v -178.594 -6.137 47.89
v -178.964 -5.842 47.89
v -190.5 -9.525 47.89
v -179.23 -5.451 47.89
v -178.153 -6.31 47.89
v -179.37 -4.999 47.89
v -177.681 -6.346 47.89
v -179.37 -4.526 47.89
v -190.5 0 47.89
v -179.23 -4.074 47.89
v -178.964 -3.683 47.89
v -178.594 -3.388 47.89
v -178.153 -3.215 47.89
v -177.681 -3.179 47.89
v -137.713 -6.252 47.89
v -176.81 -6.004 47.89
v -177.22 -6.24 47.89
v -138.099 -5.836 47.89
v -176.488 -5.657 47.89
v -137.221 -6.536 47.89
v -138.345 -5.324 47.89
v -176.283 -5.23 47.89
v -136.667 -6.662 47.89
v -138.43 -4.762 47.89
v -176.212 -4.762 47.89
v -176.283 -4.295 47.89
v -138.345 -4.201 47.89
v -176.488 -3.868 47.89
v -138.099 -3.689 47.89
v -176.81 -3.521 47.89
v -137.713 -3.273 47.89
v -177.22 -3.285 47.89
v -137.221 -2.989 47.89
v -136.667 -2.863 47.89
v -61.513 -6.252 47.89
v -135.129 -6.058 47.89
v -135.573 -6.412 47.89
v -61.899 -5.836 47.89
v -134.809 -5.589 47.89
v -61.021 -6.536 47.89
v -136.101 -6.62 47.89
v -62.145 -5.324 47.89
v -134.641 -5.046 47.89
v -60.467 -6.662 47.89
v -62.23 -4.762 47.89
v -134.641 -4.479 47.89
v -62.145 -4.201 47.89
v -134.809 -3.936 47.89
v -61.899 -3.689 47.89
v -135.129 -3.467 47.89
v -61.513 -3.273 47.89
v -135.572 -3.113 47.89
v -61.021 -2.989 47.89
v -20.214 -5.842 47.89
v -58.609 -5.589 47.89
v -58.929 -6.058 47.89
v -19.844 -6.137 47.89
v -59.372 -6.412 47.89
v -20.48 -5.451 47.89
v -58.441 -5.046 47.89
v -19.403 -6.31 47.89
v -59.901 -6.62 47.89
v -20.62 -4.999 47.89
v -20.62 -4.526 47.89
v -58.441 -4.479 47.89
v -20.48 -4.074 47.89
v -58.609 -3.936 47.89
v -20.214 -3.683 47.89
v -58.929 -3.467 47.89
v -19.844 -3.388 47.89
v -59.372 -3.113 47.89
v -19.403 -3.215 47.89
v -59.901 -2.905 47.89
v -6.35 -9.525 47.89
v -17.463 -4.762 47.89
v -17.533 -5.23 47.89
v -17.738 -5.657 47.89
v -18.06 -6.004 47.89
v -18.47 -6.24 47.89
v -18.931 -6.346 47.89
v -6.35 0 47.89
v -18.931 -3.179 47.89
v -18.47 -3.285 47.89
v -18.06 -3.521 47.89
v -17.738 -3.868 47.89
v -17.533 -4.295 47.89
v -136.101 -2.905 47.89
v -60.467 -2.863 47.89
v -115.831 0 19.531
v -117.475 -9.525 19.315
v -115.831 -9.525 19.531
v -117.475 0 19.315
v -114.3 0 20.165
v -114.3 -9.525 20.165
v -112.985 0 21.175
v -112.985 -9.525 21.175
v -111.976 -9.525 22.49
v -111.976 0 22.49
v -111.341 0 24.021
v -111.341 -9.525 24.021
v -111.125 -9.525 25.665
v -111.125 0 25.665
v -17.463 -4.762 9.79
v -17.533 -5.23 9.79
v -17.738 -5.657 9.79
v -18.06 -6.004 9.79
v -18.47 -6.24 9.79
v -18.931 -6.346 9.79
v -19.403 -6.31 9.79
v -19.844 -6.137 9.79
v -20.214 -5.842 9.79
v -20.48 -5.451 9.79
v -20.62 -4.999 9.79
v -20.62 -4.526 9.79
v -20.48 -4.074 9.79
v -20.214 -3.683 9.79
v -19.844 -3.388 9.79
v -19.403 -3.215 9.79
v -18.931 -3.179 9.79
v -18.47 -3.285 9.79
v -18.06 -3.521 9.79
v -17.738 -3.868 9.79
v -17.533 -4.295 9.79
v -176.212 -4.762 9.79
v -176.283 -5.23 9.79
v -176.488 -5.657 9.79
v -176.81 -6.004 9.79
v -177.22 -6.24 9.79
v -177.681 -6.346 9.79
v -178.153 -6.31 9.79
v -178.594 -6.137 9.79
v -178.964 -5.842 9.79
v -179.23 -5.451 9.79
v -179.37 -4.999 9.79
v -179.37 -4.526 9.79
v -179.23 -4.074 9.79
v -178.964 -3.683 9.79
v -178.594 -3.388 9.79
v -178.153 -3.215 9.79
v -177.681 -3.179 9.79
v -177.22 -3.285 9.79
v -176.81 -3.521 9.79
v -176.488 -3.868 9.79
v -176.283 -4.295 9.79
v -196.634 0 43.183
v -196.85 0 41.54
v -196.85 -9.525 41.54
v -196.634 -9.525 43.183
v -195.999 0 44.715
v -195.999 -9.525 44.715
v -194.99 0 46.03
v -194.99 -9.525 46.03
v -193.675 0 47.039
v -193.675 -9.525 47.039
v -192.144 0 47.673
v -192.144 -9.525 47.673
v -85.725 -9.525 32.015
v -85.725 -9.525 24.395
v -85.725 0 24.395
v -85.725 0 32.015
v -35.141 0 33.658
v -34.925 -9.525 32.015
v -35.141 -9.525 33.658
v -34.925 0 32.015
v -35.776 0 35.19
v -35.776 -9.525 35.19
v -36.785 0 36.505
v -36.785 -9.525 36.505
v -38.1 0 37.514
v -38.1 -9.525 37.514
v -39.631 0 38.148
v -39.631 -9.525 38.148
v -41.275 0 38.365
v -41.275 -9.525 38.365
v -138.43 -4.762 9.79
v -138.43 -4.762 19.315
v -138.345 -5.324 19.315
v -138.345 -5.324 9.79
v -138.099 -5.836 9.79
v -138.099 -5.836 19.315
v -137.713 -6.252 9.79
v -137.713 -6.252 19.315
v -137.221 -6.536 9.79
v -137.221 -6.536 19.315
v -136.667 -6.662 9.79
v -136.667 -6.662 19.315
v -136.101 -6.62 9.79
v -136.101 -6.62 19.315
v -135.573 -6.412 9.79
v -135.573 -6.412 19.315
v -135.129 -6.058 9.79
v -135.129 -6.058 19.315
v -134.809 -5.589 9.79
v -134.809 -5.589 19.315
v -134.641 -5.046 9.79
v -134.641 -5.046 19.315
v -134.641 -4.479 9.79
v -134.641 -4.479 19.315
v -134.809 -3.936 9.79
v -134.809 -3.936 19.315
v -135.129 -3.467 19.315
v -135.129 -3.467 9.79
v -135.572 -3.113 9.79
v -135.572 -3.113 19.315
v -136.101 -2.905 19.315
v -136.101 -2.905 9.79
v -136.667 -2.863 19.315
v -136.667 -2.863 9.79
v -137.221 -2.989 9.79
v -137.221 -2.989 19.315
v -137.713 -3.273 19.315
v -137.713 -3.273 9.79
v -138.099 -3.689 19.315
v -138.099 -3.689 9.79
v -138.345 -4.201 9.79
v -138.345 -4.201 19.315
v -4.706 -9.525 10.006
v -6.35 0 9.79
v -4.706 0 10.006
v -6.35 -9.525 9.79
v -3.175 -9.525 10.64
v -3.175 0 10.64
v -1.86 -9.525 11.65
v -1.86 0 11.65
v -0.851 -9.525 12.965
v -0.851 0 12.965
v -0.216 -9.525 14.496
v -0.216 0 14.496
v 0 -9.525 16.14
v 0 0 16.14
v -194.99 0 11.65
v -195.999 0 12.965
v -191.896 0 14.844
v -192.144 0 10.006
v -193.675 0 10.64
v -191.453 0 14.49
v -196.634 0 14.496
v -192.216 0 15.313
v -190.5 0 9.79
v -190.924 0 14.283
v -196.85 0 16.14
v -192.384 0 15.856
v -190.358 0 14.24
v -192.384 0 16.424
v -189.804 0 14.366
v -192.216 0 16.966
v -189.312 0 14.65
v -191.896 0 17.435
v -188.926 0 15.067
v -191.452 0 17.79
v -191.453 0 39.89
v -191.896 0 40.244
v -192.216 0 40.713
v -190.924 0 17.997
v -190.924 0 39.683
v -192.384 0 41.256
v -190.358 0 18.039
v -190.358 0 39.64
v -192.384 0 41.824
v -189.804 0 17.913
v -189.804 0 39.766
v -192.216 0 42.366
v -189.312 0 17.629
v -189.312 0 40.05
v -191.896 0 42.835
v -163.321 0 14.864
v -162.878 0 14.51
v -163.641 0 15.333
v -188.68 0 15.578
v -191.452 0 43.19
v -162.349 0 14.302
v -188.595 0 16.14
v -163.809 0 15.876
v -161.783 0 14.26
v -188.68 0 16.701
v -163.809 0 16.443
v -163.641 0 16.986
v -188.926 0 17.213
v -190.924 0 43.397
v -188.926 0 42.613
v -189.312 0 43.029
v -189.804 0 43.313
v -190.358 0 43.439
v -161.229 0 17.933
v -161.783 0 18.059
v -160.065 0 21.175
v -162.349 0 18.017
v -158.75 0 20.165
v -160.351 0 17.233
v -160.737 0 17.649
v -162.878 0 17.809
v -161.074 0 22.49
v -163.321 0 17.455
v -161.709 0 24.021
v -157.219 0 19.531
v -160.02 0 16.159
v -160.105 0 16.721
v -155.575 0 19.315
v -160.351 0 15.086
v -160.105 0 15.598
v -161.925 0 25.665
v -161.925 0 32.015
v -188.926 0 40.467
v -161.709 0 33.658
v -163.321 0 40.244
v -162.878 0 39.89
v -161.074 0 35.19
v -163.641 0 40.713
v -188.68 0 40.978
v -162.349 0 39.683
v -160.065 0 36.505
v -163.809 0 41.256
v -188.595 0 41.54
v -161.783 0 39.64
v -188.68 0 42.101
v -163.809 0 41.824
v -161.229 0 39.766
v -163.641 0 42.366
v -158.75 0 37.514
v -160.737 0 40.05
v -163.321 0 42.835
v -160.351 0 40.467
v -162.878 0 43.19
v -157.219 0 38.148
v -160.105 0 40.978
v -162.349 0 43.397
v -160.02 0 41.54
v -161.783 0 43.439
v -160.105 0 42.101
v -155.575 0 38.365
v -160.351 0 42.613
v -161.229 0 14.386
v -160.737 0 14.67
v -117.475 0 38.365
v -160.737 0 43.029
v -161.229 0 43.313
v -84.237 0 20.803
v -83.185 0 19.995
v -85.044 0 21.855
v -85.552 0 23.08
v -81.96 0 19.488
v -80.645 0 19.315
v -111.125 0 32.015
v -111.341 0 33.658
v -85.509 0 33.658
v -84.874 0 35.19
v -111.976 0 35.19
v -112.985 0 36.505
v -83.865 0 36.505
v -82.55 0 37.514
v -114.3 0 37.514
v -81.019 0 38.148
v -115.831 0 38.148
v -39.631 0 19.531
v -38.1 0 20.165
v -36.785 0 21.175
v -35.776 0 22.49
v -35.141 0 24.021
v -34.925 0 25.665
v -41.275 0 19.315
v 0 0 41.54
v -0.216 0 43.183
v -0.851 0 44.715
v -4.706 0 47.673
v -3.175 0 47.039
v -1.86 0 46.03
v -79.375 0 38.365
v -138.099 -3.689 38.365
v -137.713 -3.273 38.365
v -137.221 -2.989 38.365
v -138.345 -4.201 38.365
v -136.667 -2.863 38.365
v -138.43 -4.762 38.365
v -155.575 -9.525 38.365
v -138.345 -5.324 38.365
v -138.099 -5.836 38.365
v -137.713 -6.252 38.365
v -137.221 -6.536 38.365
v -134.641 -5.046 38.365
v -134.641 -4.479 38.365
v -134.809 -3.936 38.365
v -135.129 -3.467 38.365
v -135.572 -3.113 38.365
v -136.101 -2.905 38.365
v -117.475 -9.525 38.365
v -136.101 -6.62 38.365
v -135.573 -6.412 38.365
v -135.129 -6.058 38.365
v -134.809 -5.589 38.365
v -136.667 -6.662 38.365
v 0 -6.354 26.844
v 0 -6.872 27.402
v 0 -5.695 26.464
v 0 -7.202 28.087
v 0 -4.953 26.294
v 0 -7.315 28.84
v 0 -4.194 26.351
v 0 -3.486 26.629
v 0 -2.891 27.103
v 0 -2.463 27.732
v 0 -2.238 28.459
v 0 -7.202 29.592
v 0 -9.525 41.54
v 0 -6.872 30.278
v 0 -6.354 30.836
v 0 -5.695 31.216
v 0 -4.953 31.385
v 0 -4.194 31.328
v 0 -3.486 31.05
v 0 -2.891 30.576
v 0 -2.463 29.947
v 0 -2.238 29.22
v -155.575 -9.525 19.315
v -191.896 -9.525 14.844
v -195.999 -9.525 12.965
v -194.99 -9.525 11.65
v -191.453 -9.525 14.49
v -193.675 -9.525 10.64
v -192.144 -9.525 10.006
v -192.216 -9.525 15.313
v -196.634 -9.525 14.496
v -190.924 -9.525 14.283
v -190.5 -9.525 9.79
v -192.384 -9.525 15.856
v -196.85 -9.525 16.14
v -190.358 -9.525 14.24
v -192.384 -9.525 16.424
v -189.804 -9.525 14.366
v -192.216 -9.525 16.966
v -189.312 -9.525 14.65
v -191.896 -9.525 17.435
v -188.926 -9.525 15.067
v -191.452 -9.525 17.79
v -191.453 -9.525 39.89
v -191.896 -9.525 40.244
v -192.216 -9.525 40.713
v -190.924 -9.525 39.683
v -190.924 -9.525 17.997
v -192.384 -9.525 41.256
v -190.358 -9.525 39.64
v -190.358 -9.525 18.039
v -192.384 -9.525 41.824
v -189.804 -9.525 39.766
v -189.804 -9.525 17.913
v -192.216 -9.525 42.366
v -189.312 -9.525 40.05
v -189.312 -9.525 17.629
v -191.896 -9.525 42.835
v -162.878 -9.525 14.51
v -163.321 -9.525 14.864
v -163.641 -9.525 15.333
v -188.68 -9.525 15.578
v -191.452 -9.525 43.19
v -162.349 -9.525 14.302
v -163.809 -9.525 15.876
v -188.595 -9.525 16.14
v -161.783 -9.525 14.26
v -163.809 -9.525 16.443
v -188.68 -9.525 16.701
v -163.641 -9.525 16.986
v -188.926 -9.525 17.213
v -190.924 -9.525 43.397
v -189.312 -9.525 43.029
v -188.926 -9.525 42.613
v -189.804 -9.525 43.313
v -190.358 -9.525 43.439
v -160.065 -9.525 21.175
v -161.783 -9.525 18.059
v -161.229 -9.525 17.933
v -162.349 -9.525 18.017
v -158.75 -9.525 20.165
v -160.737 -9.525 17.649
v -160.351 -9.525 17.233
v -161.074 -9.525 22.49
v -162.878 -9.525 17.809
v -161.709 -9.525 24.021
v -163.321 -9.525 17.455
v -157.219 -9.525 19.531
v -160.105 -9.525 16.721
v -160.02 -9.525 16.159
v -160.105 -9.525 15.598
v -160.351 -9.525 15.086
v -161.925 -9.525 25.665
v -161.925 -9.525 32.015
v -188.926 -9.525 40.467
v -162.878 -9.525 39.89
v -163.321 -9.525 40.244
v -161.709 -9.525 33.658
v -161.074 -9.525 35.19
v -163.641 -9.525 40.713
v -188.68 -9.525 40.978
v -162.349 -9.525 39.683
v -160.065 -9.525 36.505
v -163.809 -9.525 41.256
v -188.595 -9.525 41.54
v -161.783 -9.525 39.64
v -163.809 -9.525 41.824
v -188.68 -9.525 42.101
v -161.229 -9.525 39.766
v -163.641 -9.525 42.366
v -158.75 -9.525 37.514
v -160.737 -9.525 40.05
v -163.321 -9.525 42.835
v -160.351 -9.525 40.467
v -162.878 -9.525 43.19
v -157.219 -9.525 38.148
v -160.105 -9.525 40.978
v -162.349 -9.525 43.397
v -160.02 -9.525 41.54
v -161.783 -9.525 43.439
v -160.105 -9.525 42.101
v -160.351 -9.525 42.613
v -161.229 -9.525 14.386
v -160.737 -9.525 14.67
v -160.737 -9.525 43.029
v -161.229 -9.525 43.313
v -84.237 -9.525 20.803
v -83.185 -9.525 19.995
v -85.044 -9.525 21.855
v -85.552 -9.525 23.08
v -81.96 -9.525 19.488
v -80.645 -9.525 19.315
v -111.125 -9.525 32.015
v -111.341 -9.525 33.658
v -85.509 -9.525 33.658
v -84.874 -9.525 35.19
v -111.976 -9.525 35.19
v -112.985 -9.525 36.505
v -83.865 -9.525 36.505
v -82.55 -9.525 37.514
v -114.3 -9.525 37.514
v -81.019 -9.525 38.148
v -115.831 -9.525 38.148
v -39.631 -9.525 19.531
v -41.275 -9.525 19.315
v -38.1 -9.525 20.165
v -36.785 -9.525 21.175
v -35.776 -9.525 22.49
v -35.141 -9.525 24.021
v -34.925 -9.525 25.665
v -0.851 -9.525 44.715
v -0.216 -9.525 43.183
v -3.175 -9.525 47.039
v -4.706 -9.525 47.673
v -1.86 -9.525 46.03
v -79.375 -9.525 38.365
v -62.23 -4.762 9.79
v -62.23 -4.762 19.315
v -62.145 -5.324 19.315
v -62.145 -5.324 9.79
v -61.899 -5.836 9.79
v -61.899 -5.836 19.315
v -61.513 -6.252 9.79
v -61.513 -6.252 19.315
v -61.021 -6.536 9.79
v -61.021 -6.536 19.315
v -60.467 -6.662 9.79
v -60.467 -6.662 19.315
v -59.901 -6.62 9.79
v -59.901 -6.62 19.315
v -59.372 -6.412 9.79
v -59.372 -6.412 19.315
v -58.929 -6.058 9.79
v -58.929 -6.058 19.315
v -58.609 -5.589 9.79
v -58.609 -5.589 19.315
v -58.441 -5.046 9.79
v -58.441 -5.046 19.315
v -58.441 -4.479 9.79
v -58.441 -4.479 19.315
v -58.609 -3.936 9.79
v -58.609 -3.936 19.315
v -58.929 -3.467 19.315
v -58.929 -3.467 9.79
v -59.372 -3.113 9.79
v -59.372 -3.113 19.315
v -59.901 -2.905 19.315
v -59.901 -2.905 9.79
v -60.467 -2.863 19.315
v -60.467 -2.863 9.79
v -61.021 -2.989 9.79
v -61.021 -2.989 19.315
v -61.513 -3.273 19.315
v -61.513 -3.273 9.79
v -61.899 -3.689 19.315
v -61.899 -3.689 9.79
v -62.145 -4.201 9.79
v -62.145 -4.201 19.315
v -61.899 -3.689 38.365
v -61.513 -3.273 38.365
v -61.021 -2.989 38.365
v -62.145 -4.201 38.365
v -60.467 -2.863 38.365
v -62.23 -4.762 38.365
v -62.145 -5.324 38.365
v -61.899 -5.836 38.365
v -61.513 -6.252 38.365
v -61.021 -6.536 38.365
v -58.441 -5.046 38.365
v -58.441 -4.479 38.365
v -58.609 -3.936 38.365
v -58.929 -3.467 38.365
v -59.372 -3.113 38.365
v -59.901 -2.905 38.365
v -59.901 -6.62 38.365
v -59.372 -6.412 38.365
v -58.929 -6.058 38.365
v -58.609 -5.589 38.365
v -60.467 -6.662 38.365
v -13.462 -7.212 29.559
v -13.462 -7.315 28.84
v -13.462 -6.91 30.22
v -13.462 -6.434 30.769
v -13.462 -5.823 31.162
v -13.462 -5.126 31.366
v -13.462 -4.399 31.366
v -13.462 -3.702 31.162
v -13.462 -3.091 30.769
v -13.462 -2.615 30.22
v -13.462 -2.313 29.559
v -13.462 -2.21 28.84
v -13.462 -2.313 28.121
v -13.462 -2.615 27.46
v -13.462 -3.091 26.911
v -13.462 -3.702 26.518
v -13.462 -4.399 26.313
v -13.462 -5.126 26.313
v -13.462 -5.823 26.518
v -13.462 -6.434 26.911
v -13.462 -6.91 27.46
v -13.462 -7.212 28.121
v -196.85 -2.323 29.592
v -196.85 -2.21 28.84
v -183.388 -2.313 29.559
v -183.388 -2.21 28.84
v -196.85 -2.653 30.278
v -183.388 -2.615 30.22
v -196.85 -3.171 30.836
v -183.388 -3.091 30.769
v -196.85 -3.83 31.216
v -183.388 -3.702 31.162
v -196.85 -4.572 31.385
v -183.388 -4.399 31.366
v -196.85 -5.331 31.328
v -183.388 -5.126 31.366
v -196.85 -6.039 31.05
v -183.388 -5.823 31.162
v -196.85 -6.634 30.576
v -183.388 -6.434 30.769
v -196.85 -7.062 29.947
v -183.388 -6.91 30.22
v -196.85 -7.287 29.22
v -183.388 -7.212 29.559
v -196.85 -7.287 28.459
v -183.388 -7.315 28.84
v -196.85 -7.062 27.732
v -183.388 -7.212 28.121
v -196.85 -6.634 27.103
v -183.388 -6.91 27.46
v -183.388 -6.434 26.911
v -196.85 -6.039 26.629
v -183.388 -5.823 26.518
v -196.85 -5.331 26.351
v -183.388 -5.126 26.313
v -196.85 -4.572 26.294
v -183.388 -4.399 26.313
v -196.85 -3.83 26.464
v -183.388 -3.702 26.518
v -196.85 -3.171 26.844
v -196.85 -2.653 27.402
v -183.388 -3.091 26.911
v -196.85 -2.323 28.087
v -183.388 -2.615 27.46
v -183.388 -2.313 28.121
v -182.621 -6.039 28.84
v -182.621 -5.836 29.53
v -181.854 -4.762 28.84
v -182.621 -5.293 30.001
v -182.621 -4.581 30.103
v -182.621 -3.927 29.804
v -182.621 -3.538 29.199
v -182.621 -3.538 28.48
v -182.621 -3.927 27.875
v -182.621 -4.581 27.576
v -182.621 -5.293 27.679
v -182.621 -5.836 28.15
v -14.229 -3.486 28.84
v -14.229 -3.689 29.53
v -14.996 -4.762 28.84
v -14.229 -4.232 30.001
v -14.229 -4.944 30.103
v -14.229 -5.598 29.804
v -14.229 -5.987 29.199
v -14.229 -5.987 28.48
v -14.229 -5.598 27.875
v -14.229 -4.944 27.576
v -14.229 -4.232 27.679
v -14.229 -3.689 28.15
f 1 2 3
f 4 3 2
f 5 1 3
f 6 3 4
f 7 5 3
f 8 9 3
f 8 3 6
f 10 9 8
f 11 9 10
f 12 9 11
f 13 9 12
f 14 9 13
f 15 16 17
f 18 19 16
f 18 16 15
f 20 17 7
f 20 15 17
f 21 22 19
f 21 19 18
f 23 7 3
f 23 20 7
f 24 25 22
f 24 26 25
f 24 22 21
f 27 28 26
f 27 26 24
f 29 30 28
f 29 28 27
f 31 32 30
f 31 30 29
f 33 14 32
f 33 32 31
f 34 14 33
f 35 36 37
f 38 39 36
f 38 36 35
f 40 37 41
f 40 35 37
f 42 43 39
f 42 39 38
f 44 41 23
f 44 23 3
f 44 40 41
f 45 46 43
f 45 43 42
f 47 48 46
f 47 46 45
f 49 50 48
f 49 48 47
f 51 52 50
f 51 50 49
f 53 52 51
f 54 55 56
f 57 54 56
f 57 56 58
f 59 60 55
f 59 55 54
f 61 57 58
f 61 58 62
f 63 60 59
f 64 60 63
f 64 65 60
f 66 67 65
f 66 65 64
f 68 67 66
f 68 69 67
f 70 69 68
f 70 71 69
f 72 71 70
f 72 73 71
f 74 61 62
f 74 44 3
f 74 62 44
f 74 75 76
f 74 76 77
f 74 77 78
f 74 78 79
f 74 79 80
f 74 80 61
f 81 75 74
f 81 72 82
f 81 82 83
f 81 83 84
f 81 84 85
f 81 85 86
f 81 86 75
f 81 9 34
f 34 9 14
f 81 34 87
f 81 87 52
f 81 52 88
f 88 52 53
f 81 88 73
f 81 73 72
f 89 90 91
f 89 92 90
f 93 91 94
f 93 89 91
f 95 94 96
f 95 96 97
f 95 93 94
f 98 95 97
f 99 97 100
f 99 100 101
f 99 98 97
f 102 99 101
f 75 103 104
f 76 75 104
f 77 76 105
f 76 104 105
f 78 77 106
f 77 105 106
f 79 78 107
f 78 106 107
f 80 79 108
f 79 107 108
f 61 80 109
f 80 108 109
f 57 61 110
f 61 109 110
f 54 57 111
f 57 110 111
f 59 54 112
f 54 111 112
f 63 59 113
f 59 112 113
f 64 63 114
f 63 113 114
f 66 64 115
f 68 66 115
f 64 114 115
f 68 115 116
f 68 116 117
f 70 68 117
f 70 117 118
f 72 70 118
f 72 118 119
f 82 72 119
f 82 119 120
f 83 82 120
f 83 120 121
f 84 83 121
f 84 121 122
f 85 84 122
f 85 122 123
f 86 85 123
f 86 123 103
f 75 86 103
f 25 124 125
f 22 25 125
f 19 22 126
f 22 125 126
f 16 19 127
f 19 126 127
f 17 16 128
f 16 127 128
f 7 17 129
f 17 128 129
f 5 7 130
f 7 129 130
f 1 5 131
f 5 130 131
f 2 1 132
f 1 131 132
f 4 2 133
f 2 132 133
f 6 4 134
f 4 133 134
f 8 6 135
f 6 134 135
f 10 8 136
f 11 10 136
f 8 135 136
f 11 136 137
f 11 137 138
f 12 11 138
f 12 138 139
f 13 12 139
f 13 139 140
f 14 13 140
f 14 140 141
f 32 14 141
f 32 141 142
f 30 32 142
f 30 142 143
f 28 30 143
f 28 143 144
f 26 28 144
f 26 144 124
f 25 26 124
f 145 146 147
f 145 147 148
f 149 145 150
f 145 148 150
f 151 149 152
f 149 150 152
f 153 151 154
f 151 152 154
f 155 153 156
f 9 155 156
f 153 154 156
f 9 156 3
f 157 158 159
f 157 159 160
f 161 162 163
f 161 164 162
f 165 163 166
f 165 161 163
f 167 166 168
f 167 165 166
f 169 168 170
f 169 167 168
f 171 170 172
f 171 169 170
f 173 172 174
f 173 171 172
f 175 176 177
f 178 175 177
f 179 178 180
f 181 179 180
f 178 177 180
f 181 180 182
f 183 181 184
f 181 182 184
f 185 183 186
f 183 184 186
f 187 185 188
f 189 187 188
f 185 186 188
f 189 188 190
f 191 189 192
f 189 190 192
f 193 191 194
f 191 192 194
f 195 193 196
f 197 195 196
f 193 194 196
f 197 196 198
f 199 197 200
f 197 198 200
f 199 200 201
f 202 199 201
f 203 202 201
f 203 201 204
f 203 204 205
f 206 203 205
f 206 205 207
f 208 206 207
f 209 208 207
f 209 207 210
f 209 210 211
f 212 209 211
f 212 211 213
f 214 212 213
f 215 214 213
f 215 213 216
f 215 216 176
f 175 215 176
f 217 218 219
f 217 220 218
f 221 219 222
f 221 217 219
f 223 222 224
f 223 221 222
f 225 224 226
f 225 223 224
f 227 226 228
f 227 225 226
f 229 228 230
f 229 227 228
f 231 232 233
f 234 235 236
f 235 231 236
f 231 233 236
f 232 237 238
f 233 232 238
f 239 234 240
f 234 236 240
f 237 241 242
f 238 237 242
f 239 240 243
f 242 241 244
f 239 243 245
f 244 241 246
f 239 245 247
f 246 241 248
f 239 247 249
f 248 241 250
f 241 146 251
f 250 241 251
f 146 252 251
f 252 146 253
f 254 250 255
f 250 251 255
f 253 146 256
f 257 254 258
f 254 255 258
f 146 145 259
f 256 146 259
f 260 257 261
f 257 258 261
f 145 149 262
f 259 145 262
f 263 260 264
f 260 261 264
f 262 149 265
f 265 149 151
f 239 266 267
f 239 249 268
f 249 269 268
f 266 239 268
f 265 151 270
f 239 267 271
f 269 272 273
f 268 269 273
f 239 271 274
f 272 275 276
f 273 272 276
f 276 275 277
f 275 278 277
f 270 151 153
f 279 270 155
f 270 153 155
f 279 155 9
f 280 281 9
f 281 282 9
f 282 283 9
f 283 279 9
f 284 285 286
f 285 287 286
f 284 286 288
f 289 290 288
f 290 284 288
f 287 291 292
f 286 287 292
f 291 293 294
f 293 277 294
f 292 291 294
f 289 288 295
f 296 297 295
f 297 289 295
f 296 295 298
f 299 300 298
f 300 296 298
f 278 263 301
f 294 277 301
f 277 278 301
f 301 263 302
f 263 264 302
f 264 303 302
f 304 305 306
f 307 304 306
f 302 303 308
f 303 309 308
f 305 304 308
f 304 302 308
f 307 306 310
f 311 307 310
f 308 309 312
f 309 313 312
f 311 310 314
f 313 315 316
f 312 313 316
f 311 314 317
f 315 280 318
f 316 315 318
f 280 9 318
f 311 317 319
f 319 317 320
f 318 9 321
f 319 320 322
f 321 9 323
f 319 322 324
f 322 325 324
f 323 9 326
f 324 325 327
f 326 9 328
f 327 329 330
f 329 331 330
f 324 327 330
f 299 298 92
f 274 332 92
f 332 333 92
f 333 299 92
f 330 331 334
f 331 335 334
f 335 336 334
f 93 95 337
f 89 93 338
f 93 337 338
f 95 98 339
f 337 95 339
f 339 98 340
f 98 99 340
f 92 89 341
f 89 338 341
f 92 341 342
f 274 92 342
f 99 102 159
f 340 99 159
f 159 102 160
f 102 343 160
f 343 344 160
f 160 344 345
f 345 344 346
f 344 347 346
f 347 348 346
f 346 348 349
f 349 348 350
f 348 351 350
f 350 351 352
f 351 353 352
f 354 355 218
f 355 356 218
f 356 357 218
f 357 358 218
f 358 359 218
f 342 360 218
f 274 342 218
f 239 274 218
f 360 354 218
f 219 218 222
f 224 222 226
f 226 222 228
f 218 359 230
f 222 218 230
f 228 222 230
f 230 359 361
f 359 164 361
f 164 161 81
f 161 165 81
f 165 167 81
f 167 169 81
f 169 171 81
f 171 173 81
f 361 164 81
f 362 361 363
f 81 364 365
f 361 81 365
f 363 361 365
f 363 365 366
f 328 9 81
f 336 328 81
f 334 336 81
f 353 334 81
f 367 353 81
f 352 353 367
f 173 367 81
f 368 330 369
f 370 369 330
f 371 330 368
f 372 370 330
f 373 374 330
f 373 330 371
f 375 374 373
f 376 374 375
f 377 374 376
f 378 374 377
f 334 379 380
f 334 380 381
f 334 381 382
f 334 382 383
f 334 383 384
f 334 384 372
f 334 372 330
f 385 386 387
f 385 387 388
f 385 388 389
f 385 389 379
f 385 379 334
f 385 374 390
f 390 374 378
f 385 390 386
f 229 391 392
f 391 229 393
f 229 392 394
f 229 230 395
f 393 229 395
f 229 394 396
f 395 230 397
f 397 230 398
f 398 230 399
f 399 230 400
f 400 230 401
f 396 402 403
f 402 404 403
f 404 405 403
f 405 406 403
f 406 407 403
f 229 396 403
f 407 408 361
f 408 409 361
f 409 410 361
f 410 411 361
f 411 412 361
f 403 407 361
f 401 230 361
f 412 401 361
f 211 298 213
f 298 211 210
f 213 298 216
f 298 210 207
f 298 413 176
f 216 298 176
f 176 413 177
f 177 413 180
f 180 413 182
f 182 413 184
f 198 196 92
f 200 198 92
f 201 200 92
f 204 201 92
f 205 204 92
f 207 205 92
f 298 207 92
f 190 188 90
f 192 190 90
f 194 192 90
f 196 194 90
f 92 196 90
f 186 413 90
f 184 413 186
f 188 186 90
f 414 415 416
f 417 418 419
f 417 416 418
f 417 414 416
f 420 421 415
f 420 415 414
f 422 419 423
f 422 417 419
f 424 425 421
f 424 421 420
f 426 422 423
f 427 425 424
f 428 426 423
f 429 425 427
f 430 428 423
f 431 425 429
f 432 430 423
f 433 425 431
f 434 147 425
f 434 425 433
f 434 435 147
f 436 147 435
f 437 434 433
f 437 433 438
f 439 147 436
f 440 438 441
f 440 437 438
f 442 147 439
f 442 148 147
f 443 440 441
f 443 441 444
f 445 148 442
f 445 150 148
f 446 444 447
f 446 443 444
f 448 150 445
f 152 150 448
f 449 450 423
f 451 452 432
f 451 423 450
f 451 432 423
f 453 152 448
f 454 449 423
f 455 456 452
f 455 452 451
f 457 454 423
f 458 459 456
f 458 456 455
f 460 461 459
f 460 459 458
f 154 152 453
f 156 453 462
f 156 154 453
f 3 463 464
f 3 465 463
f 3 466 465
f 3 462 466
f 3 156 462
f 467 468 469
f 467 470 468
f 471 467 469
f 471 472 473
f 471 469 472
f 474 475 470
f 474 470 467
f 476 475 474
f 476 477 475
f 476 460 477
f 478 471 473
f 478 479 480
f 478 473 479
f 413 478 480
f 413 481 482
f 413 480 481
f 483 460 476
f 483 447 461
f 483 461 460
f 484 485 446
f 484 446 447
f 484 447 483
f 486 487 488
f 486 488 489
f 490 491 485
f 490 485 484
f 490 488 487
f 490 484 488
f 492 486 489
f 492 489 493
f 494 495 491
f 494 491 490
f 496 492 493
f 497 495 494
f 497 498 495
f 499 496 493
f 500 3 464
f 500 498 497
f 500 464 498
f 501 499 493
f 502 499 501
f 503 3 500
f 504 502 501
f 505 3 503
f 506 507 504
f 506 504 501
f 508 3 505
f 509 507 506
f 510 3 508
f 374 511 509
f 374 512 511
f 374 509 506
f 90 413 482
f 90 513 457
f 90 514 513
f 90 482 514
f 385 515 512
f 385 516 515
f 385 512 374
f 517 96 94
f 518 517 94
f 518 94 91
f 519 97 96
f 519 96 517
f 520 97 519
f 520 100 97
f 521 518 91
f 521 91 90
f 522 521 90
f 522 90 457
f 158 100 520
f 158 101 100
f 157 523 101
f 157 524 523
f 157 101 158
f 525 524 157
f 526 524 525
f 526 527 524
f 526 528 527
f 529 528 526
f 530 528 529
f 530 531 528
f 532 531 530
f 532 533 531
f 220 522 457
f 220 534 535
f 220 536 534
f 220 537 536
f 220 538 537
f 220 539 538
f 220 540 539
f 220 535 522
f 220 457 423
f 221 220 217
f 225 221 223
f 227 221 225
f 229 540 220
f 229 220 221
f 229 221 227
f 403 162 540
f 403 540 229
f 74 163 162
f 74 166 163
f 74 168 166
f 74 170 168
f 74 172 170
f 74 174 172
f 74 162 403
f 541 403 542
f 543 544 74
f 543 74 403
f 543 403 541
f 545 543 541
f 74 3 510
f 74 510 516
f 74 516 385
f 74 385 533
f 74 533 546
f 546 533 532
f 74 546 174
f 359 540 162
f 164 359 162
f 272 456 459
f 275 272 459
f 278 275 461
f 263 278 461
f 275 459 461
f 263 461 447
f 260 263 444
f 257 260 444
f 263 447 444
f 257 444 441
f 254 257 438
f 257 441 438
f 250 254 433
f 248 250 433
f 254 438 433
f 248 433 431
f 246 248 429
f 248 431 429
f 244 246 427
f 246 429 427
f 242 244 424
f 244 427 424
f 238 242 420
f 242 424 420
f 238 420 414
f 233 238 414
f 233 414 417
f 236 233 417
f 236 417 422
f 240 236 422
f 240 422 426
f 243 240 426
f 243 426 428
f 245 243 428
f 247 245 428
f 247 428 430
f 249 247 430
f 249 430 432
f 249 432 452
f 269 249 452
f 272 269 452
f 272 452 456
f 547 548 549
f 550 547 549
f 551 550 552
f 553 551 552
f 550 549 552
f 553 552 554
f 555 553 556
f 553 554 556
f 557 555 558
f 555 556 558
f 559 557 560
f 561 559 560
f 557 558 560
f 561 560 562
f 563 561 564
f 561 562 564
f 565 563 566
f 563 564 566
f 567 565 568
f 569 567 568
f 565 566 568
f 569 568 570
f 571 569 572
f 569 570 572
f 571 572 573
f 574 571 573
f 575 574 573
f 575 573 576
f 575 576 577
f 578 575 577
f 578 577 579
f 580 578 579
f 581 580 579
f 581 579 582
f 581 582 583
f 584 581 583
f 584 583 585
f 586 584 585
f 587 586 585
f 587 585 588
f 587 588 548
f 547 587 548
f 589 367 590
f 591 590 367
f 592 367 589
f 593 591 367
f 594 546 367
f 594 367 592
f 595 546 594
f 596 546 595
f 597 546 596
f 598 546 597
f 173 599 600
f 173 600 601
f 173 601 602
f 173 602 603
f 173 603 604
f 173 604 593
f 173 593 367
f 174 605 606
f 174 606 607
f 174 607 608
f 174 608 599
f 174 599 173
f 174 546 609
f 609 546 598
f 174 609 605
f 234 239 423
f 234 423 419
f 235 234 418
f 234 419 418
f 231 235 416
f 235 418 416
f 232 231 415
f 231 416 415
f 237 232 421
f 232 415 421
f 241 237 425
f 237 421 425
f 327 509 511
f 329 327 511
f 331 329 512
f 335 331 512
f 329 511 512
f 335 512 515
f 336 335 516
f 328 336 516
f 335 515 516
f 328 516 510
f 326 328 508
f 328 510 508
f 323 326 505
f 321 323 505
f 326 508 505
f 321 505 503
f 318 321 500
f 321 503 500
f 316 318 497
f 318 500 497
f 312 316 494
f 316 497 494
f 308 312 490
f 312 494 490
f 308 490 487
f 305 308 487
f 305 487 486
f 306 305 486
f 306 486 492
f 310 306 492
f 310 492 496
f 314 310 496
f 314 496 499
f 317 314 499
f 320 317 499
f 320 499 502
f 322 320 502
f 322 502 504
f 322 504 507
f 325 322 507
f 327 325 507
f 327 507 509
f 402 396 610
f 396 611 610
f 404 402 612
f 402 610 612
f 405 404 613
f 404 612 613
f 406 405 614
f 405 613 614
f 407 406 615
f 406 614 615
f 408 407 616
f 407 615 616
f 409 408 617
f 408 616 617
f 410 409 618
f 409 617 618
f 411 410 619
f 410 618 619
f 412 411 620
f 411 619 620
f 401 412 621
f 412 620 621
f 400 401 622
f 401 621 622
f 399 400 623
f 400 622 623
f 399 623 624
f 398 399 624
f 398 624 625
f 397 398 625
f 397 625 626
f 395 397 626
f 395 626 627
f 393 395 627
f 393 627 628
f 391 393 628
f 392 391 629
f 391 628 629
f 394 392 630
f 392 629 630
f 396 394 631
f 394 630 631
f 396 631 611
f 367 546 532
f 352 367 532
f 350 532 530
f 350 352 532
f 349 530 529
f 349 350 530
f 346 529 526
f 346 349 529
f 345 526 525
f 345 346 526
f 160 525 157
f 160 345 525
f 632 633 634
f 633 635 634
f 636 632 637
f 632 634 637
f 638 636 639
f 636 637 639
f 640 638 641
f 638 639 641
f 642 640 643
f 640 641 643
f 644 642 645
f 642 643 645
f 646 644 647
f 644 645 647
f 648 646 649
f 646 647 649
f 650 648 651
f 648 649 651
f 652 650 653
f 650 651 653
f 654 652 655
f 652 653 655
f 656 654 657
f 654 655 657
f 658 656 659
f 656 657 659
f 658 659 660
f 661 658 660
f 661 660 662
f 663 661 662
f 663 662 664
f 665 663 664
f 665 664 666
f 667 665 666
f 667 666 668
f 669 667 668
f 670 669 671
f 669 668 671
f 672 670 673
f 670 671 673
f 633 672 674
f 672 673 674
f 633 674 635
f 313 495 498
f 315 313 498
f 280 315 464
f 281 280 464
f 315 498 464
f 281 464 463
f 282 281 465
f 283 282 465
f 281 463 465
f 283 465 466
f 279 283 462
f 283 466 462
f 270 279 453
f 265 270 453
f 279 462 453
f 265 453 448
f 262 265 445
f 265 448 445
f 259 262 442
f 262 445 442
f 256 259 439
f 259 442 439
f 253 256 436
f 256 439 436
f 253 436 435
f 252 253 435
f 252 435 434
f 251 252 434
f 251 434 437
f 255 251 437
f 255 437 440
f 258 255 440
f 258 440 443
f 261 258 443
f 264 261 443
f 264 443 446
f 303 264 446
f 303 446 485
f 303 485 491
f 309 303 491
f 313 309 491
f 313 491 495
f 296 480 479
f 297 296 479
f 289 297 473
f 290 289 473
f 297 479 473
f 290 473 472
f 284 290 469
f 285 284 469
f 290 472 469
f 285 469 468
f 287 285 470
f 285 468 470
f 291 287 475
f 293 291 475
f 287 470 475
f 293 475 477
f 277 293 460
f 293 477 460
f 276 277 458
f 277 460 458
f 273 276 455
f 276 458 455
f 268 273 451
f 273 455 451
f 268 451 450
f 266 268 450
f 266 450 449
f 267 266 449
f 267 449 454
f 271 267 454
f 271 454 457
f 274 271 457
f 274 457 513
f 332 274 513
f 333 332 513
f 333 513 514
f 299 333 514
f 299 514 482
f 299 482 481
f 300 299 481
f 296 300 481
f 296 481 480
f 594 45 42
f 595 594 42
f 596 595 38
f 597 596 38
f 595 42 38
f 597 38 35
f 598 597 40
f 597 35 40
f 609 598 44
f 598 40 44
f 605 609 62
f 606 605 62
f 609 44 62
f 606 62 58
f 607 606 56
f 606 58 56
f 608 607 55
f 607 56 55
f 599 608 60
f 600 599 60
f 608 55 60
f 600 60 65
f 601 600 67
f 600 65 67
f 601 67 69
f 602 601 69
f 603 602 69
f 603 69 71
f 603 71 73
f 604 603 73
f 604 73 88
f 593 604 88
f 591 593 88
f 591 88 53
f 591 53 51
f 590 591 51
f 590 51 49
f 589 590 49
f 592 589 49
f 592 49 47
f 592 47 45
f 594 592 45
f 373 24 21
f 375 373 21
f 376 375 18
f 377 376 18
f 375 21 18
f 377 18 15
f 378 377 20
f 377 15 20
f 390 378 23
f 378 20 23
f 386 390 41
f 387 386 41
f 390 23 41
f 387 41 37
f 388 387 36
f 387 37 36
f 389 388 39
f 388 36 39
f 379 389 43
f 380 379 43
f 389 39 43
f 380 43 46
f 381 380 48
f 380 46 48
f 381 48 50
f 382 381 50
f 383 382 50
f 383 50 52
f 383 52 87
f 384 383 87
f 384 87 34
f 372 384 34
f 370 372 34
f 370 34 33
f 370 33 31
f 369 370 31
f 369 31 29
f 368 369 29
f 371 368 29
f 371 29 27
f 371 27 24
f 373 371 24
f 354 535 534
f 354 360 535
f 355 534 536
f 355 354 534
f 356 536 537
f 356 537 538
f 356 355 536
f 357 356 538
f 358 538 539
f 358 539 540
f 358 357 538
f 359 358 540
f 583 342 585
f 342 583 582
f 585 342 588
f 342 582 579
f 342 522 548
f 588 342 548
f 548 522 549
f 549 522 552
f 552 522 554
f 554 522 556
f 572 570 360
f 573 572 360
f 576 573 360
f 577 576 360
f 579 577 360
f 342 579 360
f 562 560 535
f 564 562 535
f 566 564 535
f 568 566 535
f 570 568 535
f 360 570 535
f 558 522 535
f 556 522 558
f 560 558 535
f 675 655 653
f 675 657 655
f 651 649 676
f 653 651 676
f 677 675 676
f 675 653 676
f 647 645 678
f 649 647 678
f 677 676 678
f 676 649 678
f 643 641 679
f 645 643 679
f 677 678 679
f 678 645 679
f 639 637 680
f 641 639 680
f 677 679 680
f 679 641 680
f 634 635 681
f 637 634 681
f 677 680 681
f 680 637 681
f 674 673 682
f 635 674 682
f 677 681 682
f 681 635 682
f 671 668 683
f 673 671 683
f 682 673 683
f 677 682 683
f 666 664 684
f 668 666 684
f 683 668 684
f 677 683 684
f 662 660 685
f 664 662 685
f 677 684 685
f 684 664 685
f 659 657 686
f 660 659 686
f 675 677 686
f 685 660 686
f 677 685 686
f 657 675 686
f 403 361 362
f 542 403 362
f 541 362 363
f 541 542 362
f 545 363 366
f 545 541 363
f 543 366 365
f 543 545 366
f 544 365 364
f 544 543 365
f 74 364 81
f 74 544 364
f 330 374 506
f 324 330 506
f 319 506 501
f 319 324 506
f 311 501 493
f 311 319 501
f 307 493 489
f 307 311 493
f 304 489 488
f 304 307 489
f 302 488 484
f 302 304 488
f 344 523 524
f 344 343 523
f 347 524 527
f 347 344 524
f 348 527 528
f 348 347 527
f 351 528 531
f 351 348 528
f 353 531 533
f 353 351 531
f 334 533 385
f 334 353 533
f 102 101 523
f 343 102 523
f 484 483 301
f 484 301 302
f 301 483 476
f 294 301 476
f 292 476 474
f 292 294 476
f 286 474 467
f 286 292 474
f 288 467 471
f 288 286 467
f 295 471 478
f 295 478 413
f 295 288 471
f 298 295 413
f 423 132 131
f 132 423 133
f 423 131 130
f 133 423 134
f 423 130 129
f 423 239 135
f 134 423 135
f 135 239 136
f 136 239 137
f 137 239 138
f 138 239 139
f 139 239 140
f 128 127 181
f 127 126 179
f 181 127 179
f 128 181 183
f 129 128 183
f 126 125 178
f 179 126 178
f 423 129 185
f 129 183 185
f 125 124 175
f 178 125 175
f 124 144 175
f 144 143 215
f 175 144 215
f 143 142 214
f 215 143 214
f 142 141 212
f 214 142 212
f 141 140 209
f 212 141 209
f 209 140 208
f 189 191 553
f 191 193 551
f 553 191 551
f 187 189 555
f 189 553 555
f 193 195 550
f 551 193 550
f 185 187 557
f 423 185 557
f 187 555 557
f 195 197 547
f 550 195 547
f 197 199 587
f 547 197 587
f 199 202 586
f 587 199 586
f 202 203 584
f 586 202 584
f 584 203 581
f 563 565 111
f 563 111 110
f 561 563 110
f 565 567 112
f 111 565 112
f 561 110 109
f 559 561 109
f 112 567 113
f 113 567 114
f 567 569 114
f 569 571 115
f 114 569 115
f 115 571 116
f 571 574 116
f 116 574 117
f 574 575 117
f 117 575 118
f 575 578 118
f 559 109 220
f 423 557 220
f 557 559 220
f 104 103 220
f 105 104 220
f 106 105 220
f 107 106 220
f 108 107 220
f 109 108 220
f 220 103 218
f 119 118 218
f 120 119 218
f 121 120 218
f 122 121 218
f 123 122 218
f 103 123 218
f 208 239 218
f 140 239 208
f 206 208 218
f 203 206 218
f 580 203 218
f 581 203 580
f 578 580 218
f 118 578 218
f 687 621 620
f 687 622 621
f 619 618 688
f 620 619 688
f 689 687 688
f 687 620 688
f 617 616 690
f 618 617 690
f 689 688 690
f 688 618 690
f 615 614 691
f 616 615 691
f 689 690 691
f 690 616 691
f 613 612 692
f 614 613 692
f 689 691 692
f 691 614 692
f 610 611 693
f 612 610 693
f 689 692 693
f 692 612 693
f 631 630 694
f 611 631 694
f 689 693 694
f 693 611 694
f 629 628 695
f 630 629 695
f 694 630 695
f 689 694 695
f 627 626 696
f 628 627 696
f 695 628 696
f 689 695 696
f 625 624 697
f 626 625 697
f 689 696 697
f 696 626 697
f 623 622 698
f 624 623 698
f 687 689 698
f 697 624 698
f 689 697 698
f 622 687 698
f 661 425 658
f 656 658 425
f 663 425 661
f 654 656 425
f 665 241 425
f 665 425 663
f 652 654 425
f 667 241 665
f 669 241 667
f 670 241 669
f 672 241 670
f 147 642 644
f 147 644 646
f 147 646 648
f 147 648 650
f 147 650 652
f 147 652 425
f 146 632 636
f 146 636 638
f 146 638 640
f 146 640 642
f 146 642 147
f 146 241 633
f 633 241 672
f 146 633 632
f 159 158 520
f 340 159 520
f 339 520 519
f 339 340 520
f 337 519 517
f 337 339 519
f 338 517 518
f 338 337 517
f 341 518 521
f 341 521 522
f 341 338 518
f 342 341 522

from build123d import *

# Parameters (mm, degrees)
F0_W      = 196.85
F0_H      = 38.1
F1_DEPTH  = 9.525
F2_R      = 6.35
F3_R      = 6.35
F4_W      = 50.8
F4_H      = 19.05
F5_DEPTH  = 25.4
F6_R      = 6.35
F7_R      = 6.35
F8_R      = 6.35
F9_R      = 6.35
F10_W     = 50.8
F10_H     = 19.05
F11_DEPTH = 25.4
F12_R     = 6.35
F13_R     = 5.08
F14_R     = 6.35
F15_R     = 6.35
F16_R     = 1.905
F18_DEPTH = 25.4
F20_R     = 1.5875
F21_DEPTH = 48.006
F22_R     = 1.5875
F23_DEPTH = 44.3738
F26_D     = 3.81
F27_D     = 5.1054
F27_DEPTH = 13.462
F27_TIP   = 1.5338169022
F28_D     = 5.1054
F28_DEPTH = 13.462
F28_TIP   = 1.5338169022
F29_R     = 6.35


with BuildPart() as f1:
    # F0 (on Front) → F1 (new body)
    with BuildSketch(Plane.XZ):
        with Locations((-98.425, 28.8397434607)):
            Rectangle(F0_W, F0_H)
    extrude(amount=F1_DEPTH)

    # F2
    f2_edges = [f1.edges().sort_by_distance(p)[0] for p in [
        (0, -4.7625, 9.789743),
    ]]
    fillet(f2_edges, radius=F2_R)

    # F3
    f3_edges = [f1.edges().sort_by_distance(p)[0] for p in [
        (-196.85, -4.7625, 9.789743),
    ]]
    fillet(f3_edges, radius=F3_R)

    # F4 (on face) → F5 (cut)
    with BuildSketch(Plane.XZ.offset(9.525)):
        with Locations((-136.525, 28.8397434607)):
            Rectangle(F4_W, F4_H)
    extrude(amount=-F5_DEPTH, mode=Mode.SUBTRACT)

    # F6
    f6_edges = [f1.edges().sort_by_distance(p)[0] for p in [
        (-161.925, -4.7625, 38.364743),
    ]]
    fillet(f6_edges, radius=F6_R)

    # F7
    f7_edges = [f1.edges().sort_by_distance(p)[0] for p in [
        (-161.925, -4.7625, 19.314743),
    ]]
    fillet(f7_edges, radius=F7_R)

    # F8
    f8_edges = [f1.edges().sort_by_distance(p)[0] for p in [
        (-111.125, -4.7625, 19.314743),
    ]]
    fillet(f8_edges, radius=F8_R)

    # F9
    f9_edges = [f1.edges().sort_by_distance(p)[0] for p in [
        (-111.125, -4.7625, 38.364743),
    ]]
    fillet(f9_edges, radius=F9_R)

    # F10 (on face) → F11 (cut)
    with BuildSketch(Plane.XZ.offset(9.525)):
        with Locations((-60.325, 28.8397434607)):
            Rectangle(F10_W, F10_H)
    extrude(amount=-F11_DEPTH, mode=Mode.SUBTRACT)

    # F12
    f12_edges = [f1.edges().sort_by_distance(p)[0] for p in [
        (-85.725, -4.7625, 38.364743),
    ]]
    fillet(f12_edges, radius=F12_R)

    # F13
    f13_edges = [f1.edges().sort_by_distance(p)[0] for p in [
        (-85.725, -4.7625, 19.314743),
    ]]
    fillet(f13_edges, radius=F13_R)

    # F14
    f14_edges = [f1.edges().sort_by_distance(p)[0] for p in [
        (-34.925, -4.7625, 19.314743),
    ]]
    fillet(f14_edges, radius=F14_R)

    # F15
    f15_edges = [f1.edges().sort_by_distance(p)[0] for p in [
        (-34.925, -4.7625, 38.364743),
    ]]
    fillet(f15_edges, radius=F15_R)

    # F16 (on face) → F18 (cut)
    with BuildSketch(Plane.XZ.offset(9.525)):
        with Locations((-190.5, 41.5397434607)):
            Circle(F16_R)
        with Locations((-161.925, 41.5397434607)):
            Circle(F16_R)
        with Locations((-161.925, 16.1594711244)):
            Circle(F16_R)
        with Locations((-190.5, 16.1397434607)):
            Circle(F16_R)
    extrude(amount=-F18_DEPTH, mode=Mode.SUBTRACT)

    # F20 (on face) → F21 (cut)
    with BuildSketch(Plane(origin=(0, 0, 9.7897434607), x_dir=(1, 0, 0), z_dir=(0, 0, -1))):
        with Locations((-177.8, 4.7625)):
            Circle(F20_R)
    extrude(amount=-F21_DEPTH, mode=Mode.SUBTRACT)

    # F22 (on face) → F23 (cut)
    with BuildSketch(Plane(origin=(0, 0, 9.7897434607), x_dir=(1, 0, 0), z_dir=(0, 0, -1))):
        with Locations((-19.05, 4.7625)):
            Circle(F22_R)
    extrude(amount=-F23_DEPTH, mode=Mode.SUBTRACT)

    # F26 (through all)
    with Locations(Plane(origin=(0, 0, 9.7897434607), x_dir=(1, 0, 0), z_dir=(0, 0, -1))):
        with Locations((-60.325, 4.7625), (-136.525, 4.7625)):
            Hole(F26_D / 2)

    # F27
    with Locations(Plane.YZ):
        with Locations((-4.7625, 28.8397434607)):
            Hole(F27_D / 2, depth=F27_DEPTH)
            with Locations((0, 0, -(F27_DEPTH + F27_TIP / 2))):  # 118° drill point
                Cone(0, F27_D / 2, F27_TIP, mode=Mode.SUBTRACT)

    # F28
    with Locations(Plane(origin=(-196.85, 0, 0), x_dir=(0, -1, 0), z_dir=(-1, 0, 0))):
        with Locations((4.7625, 28.8397434607)):
            Hole(F28_D / 2, depth=F28_DEPTH)
            with Locations((0, 0, -(F28_DEPTH + F28_TIP / 2))):  # 118° drill point
                Cone(0, F28_D / 2, F28_TIP, mode=Mode.SUBTRACT)

    # F29
    f29_edges = [f1.edges().sort_by_distance(p)[0] for p in [
        (-196.85, -4.7625, 47.889743),
        (0, -4.7625, 47.889743),
    ]]
    fillet(f29_edges, radius=F29_R)


solid = f1.part
